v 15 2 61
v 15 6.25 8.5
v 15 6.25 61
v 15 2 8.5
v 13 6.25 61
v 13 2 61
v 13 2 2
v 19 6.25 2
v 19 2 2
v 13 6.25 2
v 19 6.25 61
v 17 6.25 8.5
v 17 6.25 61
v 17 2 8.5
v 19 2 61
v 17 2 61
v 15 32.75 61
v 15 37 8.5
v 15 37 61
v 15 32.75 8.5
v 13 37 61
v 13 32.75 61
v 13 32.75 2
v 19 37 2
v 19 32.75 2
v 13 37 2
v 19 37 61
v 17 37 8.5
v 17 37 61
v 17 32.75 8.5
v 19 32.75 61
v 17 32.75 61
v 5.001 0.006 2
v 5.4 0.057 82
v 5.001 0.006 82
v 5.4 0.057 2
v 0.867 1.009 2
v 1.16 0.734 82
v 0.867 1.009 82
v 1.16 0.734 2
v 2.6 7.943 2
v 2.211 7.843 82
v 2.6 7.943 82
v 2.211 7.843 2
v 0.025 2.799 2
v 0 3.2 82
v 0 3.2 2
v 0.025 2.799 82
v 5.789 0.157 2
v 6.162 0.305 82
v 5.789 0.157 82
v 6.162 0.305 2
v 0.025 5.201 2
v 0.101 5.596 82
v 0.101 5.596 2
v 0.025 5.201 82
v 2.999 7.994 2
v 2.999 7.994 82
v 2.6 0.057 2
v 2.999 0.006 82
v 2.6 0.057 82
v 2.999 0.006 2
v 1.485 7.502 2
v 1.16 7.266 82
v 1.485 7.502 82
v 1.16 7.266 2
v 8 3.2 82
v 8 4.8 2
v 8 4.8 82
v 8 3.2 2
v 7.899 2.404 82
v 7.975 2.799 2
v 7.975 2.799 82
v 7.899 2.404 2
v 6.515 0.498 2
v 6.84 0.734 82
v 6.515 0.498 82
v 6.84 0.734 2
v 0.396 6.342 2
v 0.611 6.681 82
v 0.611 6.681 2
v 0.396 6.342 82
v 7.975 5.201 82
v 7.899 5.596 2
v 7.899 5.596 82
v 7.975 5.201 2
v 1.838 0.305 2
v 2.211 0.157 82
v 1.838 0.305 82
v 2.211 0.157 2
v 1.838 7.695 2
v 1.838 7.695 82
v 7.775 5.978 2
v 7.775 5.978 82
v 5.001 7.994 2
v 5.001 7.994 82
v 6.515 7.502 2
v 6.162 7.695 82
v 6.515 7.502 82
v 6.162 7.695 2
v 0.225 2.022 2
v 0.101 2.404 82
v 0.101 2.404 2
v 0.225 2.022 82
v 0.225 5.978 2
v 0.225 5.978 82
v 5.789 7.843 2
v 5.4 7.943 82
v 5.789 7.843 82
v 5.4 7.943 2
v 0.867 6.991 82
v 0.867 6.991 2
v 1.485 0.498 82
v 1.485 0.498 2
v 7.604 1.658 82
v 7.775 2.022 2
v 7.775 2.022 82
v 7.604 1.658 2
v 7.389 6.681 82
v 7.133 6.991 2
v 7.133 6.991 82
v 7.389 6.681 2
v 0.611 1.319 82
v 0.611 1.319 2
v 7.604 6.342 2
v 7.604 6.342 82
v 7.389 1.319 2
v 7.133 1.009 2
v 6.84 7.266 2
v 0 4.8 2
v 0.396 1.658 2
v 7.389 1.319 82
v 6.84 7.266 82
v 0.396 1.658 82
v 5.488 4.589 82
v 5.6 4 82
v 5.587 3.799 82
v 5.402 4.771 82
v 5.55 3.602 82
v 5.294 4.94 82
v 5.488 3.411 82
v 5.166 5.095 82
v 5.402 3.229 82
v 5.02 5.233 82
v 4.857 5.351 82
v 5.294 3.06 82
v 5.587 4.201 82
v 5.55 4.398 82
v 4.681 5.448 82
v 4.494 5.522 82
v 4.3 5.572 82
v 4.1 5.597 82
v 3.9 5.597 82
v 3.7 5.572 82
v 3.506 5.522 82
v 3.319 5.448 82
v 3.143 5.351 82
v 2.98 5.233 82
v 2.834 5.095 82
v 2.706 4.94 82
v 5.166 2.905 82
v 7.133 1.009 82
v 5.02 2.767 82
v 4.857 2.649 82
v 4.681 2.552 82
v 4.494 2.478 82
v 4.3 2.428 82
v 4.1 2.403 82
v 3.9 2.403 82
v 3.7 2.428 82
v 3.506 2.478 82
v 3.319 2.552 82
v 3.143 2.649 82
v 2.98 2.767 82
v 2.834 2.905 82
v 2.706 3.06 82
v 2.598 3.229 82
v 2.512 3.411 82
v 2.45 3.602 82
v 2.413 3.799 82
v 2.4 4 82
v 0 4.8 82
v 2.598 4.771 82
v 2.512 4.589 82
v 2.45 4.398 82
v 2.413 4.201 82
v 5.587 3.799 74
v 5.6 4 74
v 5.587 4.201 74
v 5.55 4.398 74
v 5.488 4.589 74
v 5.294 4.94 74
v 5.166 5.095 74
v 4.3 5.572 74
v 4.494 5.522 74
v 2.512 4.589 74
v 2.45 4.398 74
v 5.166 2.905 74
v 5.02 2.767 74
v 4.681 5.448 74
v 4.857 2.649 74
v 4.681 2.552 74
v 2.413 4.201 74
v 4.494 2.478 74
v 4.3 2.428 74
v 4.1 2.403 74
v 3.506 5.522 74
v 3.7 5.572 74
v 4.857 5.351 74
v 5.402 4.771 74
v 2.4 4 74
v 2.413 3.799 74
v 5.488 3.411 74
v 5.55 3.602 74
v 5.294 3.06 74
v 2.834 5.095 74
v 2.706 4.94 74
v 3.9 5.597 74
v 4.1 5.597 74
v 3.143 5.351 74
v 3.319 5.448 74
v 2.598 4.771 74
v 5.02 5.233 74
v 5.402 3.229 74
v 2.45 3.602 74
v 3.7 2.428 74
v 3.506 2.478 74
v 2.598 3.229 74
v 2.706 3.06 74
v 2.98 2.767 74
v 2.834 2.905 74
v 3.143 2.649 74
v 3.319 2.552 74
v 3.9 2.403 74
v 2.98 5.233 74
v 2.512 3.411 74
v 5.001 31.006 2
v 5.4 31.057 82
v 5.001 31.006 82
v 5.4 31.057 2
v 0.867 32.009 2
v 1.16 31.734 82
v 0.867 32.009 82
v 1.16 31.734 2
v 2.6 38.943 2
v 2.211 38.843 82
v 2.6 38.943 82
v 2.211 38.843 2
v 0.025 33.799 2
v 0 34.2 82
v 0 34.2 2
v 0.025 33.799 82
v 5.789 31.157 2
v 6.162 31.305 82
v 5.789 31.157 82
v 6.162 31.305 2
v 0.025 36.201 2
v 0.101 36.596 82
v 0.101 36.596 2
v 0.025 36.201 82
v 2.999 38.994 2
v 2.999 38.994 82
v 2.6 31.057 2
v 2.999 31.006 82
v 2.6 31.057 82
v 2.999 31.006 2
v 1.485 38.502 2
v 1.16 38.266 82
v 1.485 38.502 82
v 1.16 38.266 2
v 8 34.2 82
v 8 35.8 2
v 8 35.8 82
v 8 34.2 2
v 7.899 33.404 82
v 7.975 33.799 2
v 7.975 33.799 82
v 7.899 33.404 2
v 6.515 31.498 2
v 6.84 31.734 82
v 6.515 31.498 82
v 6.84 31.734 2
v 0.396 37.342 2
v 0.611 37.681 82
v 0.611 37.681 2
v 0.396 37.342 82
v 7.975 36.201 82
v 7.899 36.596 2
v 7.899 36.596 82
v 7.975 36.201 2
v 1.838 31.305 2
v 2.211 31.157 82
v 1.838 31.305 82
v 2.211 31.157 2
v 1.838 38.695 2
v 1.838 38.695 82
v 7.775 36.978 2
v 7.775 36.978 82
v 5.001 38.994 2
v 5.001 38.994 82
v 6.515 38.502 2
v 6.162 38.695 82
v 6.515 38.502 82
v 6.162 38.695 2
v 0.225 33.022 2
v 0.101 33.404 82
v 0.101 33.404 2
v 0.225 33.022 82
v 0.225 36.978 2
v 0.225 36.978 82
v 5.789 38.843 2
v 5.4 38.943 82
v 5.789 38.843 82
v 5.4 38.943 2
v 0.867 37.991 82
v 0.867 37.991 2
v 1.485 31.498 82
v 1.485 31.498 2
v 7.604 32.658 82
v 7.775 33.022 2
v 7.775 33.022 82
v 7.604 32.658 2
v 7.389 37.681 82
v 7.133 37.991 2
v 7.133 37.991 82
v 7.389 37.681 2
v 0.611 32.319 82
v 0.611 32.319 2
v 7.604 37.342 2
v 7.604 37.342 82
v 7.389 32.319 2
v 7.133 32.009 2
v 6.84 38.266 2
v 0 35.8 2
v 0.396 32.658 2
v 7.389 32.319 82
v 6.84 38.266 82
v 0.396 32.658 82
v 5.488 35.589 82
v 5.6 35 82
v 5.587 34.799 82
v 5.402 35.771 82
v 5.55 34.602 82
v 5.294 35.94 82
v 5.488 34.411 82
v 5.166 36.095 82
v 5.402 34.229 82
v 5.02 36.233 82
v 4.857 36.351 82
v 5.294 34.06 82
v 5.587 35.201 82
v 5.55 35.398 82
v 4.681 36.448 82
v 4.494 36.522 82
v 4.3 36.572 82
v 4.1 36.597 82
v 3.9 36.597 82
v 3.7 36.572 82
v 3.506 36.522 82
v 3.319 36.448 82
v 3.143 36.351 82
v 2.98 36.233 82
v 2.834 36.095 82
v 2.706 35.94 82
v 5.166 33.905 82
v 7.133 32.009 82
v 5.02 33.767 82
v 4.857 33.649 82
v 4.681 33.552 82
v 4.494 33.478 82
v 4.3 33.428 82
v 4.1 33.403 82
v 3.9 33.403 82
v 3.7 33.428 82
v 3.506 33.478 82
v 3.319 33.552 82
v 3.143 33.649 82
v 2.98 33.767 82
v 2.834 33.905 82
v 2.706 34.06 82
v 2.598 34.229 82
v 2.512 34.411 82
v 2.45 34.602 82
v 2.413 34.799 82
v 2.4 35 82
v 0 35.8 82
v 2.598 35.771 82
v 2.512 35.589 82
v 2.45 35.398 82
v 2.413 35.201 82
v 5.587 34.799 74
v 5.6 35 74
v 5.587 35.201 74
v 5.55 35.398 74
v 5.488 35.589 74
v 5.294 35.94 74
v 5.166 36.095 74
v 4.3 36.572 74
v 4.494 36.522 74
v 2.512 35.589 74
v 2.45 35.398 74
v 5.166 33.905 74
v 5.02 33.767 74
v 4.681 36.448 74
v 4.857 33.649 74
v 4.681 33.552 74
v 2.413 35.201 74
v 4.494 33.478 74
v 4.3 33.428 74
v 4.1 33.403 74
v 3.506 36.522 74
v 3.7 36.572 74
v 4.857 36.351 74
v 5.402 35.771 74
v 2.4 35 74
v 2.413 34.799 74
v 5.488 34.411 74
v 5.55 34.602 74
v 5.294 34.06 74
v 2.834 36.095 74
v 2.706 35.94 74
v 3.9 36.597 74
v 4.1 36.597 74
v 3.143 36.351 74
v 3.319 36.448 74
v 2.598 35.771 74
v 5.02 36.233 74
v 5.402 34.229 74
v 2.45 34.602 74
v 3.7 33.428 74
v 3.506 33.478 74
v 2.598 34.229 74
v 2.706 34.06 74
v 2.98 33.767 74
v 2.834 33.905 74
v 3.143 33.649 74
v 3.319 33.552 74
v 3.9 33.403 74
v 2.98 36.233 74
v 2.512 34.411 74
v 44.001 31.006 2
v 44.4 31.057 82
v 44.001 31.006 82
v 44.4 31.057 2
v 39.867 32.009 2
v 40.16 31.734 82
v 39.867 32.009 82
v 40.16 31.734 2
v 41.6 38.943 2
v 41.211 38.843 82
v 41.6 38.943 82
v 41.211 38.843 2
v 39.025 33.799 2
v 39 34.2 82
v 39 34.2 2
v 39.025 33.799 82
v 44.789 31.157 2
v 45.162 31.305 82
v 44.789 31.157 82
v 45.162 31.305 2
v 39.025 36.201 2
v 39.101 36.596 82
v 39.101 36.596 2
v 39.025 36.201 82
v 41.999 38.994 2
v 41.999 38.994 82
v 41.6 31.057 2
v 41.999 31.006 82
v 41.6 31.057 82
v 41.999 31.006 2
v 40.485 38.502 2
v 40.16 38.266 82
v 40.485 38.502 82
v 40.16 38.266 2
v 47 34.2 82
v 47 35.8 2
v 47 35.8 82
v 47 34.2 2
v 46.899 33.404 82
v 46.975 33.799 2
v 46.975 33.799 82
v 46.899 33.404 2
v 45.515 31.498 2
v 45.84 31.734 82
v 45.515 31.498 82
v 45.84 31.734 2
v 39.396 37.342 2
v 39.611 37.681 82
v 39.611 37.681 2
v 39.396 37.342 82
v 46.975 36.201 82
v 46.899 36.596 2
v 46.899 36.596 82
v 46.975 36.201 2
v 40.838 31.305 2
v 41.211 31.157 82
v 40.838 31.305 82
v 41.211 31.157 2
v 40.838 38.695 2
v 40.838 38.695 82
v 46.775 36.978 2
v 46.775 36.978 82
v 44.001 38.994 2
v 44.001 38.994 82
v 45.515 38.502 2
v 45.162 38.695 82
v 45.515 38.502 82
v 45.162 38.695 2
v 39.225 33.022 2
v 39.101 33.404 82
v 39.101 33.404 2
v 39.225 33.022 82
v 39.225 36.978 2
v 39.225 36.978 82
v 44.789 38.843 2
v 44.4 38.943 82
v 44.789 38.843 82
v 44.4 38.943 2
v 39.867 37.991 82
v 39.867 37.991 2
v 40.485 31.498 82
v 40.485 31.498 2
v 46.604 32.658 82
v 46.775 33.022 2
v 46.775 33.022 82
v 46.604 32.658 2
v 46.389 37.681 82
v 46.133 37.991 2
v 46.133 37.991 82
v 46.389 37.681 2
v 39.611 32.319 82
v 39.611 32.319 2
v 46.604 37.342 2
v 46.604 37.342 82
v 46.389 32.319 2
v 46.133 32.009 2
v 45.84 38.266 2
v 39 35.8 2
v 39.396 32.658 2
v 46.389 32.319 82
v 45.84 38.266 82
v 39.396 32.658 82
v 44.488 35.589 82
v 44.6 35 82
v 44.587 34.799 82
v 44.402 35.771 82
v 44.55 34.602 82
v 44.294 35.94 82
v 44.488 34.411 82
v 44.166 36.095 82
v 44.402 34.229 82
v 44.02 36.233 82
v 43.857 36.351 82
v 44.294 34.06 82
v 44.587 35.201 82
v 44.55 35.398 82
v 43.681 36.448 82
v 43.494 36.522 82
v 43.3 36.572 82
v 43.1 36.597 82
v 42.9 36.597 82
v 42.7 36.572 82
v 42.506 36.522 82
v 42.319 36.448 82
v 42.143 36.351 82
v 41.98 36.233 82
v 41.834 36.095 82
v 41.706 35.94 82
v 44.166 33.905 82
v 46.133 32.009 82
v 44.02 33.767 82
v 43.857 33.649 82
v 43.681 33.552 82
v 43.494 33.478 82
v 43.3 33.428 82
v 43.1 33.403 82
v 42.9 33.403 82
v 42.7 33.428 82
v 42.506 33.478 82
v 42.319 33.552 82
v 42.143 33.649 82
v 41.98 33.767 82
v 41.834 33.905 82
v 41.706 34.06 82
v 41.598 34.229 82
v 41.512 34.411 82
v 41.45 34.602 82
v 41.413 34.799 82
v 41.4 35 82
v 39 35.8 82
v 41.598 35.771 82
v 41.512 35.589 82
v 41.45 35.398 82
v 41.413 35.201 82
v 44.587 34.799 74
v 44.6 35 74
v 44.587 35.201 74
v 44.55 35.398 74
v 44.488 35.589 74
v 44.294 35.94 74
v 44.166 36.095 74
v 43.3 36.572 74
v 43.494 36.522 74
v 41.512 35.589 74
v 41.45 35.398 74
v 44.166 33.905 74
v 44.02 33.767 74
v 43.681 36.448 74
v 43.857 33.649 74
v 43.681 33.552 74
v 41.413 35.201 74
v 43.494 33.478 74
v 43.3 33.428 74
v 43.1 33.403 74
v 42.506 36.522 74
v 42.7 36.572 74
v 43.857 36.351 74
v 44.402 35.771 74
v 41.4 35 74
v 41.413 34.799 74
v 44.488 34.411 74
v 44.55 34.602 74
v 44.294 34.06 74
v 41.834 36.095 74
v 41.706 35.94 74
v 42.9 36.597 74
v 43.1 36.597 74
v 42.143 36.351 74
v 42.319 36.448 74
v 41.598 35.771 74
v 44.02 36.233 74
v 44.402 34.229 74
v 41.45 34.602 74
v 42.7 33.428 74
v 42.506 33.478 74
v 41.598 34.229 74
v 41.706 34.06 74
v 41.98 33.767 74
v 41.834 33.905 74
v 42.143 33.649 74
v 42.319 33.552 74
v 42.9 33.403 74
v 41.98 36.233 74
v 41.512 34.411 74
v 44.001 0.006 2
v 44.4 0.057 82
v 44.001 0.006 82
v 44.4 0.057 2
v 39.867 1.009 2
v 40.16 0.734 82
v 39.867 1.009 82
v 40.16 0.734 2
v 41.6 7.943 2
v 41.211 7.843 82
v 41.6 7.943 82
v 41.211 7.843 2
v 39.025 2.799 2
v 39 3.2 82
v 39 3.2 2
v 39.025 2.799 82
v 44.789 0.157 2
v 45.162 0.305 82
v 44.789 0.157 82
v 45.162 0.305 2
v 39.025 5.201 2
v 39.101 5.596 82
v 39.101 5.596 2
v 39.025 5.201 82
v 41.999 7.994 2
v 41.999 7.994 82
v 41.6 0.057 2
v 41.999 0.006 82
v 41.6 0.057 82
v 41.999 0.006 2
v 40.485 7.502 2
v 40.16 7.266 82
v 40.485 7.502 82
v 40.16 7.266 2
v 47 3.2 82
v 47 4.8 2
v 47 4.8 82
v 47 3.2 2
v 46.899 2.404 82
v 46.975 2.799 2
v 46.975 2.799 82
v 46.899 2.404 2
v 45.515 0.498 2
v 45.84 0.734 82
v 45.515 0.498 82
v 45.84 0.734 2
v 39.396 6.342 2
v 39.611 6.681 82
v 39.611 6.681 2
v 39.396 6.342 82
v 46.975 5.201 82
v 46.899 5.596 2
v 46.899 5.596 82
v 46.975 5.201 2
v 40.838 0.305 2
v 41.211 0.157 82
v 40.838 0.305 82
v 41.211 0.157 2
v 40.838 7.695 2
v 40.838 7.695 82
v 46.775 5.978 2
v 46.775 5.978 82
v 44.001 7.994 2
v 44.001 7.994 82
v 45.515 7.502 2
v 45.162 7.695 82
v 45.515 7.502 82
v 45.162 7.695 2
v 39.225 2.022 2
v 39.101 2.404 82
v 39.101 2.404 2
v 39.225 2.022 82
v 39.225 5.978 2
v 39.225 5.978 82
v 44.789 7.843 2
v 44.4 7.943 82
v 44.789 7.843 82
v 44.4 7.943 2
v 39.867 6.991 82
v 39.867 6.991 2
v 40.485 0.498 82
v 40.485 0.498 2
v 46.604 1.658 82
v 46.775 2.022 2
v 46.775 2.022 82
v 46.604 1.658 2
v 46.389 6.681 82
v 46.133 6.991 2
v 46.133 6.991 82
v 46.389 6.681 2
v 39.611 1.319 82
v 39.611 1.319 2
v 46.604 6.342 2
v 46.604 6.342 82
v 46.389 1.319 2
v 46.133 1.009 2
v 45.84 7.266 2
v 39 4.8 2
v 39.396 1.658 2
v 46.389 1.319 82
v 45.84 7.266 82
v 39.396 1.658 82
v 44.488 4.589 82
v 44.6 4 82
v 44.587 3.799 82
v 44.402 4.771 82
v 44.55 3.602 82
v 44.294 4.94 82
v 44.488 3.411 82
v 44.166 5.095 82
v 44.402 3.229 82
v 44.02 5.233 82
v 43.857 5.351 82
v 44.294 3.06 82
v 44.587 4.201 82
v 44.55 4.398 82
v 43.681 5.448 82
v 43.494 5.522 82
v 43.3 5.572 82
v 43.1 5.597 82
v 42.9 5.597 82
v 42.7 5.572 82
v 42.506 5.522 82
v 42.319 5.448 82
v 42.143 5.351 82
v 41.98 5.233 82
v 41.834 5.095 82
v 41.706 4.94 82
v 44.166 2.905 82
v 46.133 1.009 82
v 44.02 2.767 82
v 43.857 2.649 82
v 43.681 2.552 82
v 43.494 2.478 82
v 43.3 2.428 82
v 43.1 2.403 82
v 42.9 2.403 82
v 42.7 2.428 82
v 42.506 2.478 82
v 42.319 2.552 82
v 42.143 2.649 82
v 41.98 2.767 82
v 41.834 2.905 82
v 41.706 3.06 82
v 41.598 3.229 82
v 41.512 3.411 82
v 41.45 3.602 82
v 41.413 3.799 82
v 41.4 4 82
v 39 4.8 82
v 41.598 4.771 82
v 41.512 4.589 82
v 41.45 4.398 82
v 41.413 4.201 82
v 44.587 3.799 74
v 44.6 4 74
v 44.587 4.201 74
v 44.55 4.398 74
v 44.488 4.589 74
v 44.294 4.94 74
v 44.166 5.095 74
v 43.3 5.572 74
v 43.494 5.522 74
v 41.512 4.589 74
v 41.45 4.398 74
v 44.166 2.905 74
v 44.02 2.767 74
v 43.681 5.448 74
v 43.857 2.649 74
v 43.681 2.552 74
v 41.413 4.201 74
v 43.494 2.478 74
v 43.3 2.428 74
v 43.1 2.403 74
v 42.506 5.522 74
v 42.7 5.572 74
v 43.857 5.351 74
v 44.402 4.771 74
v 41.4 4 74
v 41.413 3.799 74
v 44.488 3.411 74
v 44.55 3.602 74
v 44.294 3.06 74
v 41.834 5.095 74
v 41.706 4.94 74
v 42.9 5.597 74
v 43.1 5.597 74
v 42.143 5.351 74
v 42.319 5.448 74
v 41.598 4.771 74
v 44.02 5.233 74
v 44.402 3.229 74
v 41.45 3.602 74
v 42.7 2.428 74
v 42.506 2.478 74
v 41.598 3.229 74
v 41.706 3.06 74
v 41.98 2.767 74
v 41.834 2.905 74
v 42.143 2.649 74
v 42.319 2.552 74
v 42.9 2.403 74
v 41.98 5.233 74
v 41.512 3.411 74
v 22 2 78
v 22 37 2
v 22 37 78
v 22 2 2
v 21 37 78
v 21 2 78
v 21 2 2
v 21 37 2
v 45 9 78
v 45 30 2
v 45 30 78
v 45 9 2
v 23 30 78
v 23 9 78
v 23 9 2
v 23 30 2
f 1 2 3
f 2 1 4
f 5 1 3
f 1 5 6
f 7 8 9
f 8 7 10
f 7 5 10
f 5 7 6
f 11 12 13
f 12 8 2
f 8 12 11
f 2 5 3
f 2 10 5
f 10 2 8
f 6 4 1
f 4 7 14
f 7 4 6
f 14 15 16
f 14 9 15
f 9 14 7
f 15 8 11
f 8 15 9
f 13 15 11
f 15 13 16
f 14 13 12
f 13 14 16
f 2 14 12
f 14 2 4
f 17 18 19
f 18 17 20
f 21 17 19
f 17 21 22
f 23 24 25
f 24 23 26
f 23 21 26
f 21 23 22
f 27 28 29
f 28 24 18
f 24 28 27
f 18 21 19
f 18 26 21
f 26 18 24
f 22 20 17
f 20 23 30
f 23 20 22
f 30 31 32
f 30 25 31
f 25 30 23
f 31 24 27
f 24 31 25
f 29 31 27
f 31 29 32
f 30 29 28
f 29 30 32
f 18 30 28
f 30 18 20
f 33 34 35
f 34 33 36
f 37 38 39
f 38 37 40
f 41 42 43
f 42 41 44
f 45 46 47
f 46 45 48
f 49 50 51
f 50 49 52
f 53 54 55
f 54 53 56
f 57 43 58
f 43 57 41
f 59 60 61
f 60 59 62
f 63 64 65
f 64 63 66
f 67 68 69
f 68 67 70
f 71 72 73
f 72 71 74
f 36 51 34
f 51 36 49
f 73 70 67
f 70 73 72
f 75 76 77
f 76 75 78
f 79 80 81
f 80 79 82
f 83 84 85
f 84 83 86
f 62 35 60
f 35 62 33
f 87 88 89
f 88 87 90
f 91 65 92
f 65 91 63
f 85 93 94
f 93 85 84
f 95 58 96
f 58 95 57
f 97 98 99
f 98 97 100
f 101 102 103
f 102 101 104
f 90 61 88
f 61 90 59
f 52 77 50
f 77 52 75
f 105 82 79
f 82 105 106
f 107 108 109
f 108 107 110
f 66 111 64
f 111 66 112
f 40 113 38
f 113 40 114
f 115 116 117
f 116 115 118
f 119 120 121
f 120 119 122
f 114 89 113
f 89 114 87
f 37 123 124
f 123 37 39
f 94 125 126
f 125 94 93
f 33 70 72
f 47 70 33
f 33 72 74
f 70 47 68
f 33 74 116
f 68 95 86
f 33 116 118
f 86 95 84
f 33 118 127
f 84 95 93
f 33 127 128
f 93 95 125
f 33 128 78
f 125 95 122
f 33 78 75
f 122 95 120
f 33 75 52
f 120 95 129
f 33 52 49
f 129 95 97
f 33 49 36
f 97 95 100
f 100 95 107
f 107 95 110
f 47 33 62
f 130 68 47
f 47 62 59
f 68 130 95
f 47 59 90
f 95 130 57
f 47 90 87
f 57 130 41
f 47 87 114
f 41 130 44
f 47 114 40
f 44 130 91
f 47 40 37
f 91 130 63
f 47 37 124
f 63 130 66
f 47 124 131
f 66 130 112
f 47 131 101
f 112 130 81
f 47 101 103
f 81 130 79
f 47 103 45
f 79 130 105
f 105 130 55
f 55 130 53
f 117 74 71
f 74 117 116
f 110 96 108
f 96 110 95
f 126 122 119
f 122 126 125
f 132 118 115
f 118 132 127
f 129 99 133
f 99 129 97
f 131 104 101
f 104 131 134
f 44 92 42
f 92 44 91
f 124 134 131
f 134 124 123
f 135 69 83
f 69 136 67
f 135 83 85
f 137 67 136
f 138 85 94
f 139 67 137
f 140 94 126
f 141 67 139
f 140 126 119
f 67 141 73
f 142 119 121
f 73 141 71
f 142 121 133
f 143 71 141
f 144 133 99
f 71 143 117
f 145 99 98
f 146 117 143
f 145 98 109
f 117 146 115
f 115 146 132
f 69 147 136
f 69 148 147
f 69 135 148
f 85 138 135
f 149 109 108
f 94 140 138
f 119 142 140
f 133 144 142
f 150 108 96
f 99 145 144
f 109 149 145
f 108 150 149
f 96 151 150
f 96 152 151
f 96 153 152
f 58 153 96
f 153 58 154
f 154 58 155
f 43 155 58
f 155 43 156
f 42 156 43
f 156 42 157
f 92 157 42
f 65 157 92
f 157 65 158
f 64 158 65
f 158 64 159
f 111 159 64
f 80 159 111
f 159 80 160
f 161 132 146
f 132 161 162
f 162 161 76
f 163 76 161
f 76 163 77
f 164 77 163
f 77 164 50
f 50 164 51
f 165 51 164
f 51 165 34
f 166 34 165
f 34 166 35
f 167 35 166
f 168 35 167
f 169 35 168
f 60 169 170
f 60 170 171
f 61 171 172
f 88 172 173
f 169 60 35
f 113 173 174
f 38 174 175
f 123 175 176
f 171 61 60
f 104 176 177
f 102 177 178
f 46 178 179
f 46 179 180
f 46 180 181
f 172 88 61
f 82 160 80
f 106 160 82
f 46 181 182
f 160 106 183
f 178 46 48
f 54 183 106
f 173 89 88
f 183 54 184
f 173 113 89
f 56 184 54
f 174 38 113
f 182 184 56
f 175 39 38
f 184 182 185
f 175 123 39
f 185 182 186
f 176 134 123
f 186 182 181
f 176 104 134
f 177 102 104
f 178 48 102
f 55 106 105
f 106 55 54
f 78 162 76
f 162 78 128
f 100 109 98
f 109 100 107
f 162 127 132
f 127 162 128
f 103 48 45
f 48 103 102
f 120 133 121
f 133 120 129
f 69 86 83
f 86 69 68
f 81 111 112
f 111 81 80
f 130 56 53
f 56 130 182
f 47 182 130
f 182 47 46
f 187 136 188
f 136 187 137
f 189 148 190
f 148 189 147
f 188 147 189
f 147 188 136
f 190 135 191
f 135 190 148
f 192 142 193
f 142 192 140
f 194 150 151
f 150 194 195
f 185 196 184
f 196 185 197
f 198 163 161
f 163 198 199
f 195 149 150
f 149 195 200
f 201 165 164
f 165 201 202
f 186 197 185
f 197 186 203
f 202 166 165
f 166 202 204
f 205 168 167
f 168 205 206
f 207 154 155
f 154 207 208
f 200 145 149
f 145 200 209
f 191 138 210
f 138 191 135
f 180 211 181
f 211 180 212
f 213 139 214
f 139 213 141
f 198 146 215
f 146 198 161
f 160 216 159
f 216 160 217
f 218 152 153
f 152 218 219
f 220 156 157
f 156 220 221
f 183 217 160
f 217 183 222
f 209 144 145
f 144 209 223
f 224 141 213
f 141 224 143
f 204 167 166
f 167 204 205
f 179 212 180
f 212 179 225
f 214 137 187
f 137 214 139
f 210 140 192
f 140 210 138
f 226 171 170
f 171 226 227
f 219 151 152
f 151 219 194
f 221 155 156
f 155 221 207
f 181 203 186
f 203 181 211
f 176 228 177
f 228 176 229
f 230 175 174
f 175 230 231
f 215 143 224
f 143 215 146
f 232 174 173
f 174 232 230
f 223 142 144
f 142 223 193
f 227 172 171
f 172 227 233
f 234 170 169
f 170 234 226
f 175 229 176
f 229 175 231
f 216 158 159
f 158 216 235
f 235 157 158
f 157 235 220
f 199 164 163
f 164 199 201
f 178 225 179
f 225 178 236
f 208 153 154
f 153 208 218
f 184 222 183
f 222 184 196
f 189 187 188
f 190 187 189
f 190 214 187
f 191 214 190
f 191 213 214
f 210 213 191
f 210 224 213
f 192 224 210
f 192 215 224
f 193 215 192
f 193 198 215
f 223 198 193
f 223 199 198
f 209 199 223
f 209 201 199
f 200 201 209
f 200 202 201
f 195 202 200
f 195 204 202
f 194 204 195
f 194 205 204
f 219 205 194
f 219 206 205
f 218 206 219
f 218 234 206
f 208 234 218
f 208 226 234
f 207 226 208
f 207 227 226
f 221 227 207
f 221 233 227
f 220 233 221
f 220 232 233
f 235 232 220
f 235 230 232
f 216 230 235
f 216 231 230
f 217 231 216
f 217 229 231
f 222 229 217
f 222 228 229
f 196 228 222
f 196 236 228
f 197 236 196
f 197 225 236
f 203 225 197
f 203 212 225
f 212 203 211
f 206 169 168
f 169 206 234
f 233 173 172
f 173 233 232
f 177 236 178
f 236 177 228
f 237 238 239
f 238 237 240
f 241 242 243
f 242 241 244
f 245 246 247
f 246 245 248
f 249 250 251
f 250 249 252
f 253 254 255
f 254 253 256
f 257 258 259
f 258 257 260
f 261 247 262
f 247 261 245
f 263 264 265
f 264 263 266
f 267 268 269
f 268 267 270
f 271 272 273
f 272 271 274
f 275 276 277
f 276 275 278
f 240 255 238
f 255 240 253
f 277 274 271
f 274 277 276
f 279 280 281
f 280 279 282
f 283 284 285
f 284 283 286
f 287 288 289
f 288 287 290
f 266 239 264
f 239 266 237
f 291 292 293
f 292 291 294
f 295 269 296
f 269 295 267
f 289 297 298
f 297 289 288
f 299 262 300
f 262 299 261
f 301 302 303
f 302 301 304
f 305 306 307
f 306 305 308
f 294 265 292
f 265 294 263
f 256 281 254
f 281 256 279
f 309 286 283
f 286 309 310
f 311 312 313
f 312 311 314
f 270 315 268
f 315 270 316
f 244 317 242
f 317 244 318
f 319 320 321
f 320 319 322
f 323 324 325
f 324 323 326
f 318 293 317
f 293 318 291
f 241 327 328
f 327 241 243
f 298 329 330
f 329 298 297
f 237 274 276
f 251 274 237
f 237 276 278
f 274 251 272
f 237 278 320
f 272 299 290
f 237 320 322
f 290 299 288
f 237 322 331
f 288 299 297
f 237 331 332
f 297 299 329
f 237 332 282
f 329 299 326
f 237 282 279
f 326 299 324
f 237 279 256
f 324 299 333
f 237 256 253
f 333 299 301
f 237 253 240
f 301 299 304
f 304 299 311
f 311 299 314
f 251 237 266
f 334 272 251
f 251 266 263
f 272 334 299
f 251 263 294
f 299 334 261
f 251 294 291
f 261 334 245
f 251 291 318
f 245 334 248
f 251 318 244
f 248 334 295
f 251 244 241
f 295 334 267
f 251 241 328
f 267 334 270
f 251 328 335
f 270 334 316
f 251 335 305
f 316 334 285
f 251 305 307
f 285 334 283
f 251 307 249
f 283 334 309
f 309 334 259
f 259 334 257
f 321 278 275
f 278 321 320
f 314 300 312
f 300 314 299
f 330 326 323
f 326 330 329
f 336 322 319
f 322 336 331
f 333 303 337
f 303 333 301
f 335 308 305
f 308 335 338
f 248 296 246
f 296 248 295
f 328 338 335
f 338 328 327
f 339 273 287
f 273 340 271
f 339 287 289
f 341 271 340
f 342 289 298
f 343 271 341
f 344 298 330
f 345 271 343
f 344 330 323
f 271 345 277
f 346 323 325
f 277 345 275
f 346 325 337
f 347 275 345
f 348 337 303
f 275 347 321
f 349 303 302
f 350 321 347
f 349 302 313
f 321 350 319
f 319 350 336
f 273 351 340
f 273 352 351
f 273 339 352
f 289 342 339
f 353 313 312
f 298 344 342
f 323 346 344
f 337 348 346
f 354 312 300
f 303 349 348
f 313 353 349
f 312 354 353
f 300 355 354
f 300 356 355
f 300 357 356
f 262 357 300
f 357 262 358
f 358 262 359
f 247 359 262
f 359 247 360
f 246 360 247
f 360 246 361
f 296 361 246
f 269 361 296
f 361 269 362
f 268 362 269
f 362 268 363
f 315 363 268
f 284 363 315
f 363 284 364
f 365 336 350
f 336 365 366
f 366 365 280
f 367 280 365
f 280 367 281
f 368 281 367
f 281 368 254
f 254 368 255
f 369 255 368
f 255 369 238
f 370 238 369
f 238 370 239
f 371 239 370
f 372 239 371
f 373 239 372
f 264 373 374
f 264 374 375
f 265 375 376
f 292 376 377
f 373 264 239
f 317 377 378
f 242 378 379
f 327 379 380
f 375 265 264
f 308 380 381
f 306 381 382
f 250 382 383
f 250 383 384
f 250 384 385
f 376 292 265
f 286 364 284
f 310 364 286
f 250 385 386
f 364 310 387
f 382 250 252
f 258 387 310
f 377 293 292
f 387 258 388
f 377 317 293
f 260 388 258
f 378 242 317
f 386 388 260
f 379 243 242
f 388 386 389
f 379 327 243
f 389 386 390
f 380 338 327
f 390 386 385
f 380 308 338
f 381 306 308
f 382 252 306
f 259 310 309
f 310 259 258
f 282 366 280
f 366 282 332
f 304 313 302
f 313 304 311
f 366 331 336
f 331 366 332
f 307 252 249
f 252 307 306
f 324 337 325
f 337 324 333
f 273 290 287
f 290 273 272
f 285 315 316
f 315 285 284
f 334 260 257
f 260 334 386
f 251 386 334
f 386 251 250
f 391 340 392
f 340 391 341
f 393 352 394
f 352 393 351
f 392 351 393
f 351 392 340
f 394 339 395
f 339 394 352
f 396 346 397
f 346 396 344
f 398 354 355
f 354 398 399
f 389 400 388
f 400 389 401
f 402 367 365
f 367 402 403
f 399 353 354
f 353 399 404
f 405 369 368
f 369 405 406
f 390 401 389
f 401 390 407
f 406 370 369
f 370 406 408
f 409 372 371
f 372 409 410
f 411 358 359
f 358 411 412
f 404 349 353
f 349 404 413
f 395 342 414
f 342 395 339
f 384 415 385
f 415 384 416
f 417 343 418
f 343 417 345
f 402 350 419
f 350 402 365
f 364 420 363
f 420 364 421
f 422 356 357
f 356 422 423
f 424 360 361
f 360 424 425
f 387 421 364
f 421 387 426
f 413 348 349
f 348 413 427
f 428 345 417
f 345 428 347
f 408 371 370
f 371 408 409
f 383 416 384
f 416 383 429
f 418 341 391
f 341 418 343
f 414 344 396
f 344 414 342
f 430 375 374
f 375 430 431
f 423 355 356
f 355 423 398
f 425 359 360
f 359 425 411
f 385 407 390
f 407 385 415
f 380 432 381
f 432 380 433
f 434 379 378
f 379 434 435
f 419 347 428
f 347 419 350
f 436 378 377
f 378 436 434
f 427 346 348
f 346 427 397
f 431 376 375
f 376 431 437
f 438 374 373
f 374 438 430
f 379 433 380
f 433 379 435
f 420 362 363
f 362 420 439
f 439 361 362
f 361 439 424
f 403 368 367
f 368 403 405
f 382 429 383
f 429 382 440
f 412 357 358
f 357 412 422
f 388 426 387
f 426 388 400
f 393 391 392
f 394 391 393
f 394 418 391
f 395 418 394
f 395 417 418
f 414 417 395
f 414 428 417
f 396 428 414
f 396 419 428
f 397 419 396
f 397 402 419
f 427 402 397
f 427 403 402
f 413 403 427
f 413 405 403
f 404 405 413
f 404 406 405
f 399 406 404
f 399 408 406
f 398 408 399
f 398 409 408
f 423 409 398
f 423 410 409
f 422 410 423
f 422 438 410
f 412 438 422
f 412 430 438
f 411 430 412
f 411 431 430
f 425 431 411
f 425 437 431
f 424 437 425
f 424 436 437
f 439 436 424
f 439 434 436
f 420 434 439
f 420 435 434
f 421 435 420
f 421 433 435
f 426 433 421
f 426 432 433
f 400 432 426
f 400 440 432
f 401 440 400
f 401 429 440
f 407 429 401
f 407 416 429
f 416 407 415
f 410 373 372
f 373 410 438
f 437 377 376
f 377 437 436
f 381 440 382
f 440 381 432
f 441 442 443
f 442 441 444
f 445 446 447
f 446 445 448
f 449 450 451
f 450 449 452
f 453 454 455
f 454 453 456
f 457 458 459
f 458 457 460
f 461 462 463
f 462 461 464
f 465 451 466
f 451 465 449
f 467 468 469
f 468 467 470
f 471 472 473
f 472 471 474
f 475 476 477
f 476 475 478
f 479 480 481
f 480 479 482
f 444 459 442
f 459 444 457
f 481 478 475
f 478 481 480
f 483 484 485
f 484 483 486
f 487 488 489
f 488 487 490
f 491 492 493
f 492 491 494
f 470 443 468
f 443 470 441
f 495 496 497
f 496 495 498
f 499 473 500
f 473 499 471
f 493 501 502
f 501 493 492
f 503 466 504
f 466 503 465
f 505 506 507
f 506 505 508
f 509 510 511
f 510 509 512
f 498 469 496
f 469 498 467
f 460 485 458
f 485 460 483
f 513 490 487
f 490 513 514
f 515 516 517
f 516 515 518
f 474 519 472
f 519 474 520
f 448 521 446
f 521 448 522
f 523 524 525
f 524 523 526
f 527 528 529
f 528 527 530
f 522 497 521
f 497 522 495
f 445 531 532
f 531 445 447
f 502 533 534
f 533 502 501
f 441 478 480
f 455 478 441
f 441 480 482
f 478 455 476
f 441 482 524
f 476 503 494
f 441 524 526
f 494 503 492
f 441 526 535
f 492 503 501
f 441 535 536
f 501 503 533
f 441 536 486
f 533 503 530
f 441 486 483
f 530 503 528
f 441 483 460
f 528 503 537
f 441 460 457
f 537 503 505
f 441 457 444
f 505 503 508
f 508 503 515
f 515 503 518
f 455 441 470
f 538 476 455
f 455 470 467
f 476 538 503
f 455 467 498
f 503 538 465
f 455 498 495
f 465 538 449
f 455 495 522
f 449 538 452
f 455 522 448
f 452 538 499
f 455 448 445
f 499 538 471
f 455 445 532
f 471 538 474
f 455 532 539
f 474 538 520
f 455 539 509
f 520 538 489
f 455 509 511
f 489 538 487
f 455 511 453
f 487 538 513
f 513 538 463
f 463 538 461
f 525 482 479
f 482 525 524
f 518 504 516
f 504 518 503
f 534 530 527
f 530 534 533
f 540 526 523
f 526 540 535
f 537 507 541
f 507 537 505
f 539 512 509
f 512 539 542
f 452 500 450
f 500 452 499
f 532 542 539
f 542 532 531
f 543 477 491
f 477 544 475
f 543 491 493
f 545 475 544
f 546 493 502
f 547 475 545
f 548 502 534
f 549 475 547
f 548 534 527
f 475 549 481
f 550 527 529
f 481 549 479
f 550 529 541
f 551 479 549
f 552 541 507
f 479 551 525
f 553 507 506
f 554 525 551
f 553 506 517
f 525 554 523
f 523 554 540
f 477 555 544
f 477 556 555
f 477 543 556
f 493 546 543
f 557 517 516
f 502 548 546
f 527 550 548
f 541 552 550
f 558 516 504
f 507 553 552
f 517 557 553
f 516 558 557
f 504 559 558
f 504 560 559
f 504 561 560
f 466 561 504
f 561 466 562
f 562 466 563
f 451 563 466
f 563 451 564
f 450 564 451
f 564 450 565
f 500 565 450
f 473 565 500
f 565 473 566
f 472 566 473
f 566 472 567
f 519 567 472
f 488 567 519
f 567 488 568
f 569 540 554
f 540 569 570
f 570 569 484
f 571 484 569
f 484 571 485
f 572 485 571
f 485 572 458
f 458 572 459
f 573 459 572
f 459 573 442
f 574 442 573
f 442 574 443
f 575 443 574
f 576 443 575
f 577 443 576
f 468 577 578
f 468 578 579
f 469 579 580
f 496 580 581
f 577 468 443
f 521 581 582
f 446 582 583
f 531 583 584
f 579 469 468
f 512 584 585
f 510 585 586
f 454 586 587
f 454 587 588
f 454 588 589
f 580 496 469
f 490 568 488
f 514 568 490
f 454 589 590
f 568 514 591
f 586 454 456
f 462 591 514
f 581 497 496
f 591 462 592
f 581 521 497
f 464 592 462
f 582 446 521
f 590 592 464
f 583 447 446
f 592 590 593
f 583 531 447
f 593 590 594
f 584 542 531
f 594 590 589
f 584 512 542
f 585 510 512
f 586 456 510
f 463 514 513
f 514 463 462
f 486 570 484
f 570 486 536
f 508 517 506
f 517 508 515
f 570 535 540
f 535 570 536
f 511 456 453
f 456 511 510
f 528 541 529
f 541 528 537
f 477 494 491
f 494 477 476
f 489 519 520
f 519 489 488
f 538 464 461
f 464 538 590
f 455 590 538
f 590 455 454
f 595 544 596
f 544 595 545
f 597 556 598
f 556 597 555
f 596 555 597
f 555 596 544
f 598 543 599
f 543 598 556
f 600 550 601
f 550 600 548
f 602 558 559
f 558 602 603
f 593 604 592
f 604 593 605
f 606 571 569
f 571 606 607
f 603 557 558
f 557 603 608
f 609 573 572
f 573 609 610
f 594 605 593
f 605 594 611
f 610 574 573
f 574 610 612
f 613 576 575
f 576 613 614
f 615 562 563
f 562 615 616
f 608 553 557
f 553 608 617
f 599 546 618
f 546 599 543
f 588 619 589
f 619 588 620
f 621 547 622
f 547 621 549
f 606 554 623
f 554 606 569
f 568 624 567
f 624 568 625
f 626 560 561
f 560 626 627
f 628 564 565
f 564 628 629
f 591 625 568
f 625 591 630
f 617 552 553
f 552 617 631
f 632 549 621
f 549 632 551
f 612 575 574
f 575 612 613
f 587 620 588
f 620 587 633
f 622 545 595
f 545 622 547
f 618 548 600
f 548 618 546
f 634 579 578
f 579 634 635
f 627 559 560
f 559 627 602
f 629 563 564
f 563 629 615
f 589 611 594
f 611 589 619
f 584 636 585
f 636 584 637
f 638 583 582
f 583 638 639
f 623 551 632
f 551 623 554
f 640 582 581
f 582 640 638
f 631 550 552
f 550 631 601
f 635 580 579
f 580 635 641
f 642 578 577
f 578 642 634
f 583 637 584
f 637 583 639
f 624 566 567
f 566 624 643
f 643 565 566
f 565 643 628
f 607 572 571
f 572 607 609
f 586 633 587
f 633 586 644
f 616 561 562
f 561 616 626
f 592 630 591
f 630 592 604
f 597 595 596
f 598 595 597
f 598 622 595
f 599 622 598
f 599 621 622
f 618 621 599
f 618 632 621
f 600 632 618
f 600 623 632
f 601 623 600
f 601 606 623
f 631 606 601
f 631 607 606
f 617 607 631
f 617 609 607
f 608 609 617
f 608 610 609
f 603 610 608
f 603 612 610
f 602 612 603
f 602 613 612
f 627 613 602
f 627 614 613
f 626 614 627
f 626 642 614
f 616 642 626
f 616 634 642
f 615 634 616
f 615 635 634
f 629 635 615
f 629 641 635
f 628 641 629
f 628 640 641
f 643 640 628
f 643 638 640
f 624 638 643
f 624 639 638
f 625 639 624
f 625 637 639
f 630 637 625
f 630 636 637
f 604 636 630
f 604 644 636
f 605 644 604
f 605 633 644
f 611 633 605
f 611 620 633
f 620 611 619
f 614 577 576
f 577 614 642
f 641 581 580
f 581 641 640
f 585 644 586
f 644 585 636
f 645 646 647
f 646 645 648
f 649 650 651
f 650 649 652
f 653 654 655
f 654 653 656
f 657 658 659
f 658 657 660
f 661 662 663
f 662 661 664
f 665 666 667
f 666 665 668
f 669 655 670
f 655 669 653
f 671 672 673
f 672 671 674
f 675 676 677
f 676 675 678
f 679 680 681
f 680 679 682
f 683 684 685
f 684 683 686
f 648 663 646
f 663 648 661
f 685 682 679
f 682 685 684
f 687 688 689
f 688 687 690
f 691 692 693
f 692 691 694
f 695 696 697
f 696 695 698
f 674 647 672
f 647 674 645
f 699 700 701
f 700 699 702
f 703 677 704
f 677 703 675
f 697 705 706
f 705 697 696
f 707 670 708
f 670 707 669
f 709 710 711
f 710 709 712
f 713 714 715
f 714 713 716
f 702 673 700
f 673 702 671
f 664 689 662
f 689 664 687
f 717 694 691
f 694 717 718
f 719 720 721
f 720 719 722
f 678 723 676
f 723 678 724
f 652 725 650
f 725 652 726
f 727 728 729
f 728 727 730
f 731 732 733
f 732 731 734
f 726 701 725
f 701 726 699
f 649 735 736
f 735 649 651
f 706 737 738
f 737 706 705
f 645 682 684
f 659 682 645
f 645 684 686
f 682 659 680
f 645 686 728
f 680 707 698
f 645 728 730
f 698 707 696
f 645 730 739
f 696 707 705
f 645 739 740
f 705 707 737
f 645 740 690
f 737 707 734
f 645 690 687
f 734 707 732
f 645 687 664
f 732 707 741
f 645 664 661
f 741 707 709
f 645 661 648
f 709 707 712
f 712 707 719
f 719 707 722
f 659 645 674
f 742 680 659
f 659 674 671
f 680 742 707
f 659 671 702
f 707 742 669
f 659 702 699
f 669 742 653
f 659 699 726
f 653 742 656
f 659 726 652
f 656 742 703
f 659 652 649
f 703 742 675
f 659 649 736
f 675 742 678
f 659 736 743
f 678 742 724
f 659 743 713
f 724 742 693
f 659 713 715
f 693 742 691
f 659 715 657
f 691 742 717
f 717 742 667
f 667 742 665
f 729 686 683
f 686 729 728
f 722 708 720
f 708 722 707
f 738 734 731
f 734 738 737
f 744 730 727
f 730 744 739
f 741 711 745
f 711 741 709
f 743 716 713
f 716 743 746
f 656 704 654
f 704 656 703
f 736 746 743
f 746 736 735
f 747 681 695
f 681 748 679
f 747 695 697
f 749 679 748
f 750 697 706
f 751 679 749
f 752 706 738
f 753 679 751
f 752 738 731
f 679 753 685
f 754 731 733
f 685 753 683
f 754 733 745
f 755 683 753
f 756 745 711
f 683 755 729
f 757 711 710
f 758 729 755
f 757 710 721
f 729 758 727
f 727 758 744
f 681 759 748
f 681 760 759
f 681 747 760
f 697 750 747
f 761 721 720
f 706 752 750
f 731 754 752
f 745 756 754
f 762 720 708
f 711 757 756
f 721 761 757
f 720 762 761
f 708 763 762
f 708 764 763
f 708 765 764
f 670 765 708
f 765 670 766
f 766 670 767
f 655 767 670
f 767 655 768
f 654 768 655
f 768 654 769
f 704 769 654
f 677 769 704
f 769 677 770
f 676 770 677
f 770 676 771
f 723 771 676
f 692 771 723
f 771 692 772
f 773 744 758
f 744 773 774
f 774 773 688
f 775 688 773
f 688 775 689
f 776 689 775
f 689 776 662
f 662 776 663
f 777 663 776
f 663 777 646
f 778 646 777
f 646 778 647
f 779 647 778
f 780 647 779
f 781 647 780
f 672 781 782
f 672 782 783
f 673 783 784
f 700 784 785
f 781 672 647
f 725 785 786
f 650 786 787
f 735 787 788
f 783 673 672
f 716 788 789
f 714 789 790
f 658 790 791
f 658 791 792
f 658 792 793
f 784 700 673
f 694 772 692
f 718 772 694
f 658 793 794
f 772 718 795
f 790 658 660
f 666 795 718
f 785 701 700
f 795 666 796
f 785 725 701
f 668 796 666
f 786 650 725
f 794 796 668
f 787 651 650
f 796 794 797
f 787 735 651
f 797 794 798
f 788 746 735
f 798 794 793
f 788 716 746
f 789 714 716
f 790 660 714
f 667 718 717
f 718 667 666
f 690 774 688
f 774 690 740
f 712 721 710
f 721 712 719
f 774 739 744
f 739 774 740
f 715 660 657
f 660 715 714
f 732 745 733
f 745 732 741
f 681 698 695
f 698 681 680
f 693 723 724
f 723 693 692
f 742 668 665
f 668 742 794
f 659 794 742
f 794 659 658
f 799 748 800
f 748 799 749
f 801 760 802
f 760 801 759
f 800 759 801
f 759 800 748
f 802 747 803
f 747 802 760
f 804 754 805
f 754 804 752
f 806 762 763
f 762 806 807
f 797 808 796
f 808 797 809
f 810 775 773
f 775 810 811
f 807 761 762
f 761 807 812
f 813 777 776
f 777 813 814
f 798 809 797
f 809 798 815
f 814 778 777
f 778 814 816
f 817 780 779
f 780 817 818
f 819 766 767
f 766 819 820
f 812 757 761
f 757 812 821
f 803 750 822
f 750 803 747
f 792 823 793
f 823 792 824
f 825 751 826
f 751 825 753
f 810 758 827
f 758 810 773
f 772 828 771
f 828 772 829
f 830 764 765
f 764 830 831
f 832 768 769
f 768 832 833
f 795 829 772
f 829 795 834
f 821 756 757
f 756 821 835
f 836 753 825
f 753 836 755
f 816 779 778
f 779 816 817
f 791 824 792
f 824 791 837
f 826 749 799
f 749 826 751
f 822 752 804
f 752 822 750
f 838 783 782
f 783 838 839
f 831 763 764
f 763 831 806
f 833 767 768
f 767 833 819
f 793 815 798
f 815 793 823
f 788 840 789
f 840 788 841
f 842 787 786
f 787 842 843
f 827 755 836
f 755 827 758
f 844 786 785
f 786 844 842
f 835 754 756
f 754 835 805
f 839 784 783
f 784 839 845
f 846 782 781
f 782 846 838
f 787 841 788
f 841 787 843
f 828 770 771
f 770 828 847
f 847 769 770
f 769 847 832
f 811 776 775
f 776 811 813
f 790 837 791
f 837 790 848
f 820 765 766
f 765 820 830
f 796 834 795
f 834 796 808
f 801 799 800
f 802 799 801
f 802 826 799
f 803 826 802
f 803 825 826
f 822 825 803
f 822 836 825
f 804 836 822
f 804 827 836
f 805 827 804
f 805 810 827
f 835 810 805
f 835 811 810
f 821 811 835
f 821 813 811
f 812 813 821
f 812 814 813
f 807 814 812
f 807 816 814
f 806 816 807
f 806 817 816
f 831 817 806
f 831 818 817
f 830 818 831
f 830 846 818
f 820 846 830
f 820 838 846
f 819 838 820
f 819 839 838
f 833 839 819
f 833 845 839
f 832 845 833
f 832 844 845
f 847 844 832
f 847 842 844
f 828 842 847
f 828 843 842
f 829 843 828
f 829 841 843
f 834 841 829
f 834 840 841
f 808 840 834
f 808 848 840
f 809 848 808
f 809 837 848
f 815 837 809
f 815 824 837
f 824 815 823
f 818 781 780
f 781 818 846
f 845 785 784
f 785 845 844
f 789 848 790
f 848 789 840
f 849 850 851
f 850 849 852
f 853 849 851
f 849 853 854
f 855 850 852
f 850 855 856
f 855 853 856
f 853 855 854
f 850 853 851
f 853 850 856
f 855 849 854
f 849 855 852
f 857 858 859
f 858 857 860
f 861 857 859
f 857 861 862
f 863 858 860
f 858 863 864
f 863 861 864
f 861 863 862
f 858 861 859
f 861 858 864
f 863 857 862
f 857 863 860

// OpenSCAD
/**
 * Case for Capacitive Soil Sensors
 * 
 * License: Creative Commons Attribution-ShareAlike 4.0 International
 * Copyright 2017 Alan Lord
**/
$fn = 50;

l = 80;
w = 35;
h = 43;

prbw = 17;
prbd = 2;

wall = 2;

nutSize = 6;
nutHeight = 3;
nutThread = 3.2;
boltLength = 8;
fix=8;

pcbw = 29.5;
pcbh = 52.5;
pcbpad = 6.5;

pcbwctrs = 20.320;
pcbdctrs = 51.435;

sloth=((w-pcbw)/2)+1.5;

slotDepthFromTop = 15;

// Display the box
box();

// Display the lid
%lid();

module box() {
    %difference() { // The % makes the external wall transparent ot invisibble
        roundedCube(h+wall*2,w+wall*2,l+wall,nutThread);
        translate([wall,wall,wall]) {
            roundedCube(h,w,l,nutThread);
        }
        translate([slotDepthFromTop,((w+wall*2)-prbw)/2,0]) {
            cube([prbd,prbw,wall*2]);
        }
    }
    translate([slotDepthFromTop-wall,wall,wall]) {
        pcbSlot(pcbh);
    }
    translate([slotDepthFromTop-wall,w+wall-sloth,wall]) {
        pcbSlot(pcbh);
    }
    translate([slotDepthFromTop+wall*3,wall,wall]) {
        cube([1,w,l-wall*2]);
    }
    fixing();
    translate([0,(w+wall*2)-fix,0]) {
        fixing();
    }
    translate([(h+wall*2)-fix,(w+wall*2)-fix,0]) {
        fixing();
    }
    translate([(h+wall*2)-fix,0,0]) {
        fixing();
    }
    
    x=(h-22+wall);
    y=((w+wall*2)-21)/2;
    translate([x,y,wall]) {
        battery();
    }
}


module lid() {
    xtrns = nutHeight+wall+8.5;
    difference(){
        translate([0,0,l+wall]) {
            roundedCube(h+wall*2,w+wall*2,wall,nutThread);
        }
        translate([fix/2,fix/2,l+wall]) {
            cylinder(d=nutThread,h=wall);
        }
        translate([(h+wall*2)-fix/2,fix/2,l+wall]) {
            cylinder(d=nutThread,h=wall);
        }
        translate([(h+wall*2)-fix/2,(w+wall*2)-fix/2,l+wall]) {
            cylinder(d=nutThread,h=wall);
        }
        translate([fix/2,(w+wall*2)-fix/2,l+wall]) {
            cylinder(d=nutThread,h=wall);
        }
    }
    sloth=l-(pcbh+pcbpad)-1;
    translate([slotDepthFromTop-wall,((w+wall*2)-w)/2,l-sloth+wall]) {
        difference() {
            cube([wall*3,w,sloth]);
            translate([0,w/2,0]) {
                rotate([90,0,90]) cylinder(h=wall*3,d=5);
            }
        }
    }
    translate([h-10,(w+wall*2)/2,(l+wall)-3]) {
        cylinder(h=3,d=10);
    }

}

module bolt(width,height,thread,length,hull) {
    cylinder(d=width/(cos(180/6)), h=height, $fn=6);
    if(hull) {
        hull(){
            translate([0,0,height]) {
                cylinder(d=thread,h=length);
            }
            translate([thread,0,height]) {
                cylinder(d=thread,h=length);
            }
        }
    } else {
        translate([0,0,height]) {
            cylinder(d=thread,h=length);
        }
    }
}

module fixing() {
    difference() {
        translate([0,0,wall]){
            roundedCube(fix,fix,l,nutThread);
        }
        translate([fix/2,fix/2,l-(boltLength-wall)]) {
            cylinder(d=nutThread,h=boltLength);
        }
    }
}

module battery() {
    l=76;
    w=21;
    h=22;
    cube([h,w,l]);
}

module pcbSlot(l) {
    cube([wall,sloth,l+pcbpad]);
    translate([wall*2,0,0]) {
        cube([wall,sloth,l+pcbpad]);
    }
    translate([wall,0,0]) {
        cube([prbd,sloth,pcbpad]);
    }
}

module roundedCube(xdim,ydim,zdim,rdim) {
    hull() {
        translate([rdim,rdim,0]) cylinder(r=rdim,h=zdim);
        translate([xdim-rdim,rdim,0]) cylinder(r=rdim,h=zdim);
        translate([rdim,ydim-rdim,0]) cylinder(r=rdim,h=zdim);
        translate([xdim-rdim,ydim-rdim,0]) cylinder(r=rdim,h=zdim);
    }
}
